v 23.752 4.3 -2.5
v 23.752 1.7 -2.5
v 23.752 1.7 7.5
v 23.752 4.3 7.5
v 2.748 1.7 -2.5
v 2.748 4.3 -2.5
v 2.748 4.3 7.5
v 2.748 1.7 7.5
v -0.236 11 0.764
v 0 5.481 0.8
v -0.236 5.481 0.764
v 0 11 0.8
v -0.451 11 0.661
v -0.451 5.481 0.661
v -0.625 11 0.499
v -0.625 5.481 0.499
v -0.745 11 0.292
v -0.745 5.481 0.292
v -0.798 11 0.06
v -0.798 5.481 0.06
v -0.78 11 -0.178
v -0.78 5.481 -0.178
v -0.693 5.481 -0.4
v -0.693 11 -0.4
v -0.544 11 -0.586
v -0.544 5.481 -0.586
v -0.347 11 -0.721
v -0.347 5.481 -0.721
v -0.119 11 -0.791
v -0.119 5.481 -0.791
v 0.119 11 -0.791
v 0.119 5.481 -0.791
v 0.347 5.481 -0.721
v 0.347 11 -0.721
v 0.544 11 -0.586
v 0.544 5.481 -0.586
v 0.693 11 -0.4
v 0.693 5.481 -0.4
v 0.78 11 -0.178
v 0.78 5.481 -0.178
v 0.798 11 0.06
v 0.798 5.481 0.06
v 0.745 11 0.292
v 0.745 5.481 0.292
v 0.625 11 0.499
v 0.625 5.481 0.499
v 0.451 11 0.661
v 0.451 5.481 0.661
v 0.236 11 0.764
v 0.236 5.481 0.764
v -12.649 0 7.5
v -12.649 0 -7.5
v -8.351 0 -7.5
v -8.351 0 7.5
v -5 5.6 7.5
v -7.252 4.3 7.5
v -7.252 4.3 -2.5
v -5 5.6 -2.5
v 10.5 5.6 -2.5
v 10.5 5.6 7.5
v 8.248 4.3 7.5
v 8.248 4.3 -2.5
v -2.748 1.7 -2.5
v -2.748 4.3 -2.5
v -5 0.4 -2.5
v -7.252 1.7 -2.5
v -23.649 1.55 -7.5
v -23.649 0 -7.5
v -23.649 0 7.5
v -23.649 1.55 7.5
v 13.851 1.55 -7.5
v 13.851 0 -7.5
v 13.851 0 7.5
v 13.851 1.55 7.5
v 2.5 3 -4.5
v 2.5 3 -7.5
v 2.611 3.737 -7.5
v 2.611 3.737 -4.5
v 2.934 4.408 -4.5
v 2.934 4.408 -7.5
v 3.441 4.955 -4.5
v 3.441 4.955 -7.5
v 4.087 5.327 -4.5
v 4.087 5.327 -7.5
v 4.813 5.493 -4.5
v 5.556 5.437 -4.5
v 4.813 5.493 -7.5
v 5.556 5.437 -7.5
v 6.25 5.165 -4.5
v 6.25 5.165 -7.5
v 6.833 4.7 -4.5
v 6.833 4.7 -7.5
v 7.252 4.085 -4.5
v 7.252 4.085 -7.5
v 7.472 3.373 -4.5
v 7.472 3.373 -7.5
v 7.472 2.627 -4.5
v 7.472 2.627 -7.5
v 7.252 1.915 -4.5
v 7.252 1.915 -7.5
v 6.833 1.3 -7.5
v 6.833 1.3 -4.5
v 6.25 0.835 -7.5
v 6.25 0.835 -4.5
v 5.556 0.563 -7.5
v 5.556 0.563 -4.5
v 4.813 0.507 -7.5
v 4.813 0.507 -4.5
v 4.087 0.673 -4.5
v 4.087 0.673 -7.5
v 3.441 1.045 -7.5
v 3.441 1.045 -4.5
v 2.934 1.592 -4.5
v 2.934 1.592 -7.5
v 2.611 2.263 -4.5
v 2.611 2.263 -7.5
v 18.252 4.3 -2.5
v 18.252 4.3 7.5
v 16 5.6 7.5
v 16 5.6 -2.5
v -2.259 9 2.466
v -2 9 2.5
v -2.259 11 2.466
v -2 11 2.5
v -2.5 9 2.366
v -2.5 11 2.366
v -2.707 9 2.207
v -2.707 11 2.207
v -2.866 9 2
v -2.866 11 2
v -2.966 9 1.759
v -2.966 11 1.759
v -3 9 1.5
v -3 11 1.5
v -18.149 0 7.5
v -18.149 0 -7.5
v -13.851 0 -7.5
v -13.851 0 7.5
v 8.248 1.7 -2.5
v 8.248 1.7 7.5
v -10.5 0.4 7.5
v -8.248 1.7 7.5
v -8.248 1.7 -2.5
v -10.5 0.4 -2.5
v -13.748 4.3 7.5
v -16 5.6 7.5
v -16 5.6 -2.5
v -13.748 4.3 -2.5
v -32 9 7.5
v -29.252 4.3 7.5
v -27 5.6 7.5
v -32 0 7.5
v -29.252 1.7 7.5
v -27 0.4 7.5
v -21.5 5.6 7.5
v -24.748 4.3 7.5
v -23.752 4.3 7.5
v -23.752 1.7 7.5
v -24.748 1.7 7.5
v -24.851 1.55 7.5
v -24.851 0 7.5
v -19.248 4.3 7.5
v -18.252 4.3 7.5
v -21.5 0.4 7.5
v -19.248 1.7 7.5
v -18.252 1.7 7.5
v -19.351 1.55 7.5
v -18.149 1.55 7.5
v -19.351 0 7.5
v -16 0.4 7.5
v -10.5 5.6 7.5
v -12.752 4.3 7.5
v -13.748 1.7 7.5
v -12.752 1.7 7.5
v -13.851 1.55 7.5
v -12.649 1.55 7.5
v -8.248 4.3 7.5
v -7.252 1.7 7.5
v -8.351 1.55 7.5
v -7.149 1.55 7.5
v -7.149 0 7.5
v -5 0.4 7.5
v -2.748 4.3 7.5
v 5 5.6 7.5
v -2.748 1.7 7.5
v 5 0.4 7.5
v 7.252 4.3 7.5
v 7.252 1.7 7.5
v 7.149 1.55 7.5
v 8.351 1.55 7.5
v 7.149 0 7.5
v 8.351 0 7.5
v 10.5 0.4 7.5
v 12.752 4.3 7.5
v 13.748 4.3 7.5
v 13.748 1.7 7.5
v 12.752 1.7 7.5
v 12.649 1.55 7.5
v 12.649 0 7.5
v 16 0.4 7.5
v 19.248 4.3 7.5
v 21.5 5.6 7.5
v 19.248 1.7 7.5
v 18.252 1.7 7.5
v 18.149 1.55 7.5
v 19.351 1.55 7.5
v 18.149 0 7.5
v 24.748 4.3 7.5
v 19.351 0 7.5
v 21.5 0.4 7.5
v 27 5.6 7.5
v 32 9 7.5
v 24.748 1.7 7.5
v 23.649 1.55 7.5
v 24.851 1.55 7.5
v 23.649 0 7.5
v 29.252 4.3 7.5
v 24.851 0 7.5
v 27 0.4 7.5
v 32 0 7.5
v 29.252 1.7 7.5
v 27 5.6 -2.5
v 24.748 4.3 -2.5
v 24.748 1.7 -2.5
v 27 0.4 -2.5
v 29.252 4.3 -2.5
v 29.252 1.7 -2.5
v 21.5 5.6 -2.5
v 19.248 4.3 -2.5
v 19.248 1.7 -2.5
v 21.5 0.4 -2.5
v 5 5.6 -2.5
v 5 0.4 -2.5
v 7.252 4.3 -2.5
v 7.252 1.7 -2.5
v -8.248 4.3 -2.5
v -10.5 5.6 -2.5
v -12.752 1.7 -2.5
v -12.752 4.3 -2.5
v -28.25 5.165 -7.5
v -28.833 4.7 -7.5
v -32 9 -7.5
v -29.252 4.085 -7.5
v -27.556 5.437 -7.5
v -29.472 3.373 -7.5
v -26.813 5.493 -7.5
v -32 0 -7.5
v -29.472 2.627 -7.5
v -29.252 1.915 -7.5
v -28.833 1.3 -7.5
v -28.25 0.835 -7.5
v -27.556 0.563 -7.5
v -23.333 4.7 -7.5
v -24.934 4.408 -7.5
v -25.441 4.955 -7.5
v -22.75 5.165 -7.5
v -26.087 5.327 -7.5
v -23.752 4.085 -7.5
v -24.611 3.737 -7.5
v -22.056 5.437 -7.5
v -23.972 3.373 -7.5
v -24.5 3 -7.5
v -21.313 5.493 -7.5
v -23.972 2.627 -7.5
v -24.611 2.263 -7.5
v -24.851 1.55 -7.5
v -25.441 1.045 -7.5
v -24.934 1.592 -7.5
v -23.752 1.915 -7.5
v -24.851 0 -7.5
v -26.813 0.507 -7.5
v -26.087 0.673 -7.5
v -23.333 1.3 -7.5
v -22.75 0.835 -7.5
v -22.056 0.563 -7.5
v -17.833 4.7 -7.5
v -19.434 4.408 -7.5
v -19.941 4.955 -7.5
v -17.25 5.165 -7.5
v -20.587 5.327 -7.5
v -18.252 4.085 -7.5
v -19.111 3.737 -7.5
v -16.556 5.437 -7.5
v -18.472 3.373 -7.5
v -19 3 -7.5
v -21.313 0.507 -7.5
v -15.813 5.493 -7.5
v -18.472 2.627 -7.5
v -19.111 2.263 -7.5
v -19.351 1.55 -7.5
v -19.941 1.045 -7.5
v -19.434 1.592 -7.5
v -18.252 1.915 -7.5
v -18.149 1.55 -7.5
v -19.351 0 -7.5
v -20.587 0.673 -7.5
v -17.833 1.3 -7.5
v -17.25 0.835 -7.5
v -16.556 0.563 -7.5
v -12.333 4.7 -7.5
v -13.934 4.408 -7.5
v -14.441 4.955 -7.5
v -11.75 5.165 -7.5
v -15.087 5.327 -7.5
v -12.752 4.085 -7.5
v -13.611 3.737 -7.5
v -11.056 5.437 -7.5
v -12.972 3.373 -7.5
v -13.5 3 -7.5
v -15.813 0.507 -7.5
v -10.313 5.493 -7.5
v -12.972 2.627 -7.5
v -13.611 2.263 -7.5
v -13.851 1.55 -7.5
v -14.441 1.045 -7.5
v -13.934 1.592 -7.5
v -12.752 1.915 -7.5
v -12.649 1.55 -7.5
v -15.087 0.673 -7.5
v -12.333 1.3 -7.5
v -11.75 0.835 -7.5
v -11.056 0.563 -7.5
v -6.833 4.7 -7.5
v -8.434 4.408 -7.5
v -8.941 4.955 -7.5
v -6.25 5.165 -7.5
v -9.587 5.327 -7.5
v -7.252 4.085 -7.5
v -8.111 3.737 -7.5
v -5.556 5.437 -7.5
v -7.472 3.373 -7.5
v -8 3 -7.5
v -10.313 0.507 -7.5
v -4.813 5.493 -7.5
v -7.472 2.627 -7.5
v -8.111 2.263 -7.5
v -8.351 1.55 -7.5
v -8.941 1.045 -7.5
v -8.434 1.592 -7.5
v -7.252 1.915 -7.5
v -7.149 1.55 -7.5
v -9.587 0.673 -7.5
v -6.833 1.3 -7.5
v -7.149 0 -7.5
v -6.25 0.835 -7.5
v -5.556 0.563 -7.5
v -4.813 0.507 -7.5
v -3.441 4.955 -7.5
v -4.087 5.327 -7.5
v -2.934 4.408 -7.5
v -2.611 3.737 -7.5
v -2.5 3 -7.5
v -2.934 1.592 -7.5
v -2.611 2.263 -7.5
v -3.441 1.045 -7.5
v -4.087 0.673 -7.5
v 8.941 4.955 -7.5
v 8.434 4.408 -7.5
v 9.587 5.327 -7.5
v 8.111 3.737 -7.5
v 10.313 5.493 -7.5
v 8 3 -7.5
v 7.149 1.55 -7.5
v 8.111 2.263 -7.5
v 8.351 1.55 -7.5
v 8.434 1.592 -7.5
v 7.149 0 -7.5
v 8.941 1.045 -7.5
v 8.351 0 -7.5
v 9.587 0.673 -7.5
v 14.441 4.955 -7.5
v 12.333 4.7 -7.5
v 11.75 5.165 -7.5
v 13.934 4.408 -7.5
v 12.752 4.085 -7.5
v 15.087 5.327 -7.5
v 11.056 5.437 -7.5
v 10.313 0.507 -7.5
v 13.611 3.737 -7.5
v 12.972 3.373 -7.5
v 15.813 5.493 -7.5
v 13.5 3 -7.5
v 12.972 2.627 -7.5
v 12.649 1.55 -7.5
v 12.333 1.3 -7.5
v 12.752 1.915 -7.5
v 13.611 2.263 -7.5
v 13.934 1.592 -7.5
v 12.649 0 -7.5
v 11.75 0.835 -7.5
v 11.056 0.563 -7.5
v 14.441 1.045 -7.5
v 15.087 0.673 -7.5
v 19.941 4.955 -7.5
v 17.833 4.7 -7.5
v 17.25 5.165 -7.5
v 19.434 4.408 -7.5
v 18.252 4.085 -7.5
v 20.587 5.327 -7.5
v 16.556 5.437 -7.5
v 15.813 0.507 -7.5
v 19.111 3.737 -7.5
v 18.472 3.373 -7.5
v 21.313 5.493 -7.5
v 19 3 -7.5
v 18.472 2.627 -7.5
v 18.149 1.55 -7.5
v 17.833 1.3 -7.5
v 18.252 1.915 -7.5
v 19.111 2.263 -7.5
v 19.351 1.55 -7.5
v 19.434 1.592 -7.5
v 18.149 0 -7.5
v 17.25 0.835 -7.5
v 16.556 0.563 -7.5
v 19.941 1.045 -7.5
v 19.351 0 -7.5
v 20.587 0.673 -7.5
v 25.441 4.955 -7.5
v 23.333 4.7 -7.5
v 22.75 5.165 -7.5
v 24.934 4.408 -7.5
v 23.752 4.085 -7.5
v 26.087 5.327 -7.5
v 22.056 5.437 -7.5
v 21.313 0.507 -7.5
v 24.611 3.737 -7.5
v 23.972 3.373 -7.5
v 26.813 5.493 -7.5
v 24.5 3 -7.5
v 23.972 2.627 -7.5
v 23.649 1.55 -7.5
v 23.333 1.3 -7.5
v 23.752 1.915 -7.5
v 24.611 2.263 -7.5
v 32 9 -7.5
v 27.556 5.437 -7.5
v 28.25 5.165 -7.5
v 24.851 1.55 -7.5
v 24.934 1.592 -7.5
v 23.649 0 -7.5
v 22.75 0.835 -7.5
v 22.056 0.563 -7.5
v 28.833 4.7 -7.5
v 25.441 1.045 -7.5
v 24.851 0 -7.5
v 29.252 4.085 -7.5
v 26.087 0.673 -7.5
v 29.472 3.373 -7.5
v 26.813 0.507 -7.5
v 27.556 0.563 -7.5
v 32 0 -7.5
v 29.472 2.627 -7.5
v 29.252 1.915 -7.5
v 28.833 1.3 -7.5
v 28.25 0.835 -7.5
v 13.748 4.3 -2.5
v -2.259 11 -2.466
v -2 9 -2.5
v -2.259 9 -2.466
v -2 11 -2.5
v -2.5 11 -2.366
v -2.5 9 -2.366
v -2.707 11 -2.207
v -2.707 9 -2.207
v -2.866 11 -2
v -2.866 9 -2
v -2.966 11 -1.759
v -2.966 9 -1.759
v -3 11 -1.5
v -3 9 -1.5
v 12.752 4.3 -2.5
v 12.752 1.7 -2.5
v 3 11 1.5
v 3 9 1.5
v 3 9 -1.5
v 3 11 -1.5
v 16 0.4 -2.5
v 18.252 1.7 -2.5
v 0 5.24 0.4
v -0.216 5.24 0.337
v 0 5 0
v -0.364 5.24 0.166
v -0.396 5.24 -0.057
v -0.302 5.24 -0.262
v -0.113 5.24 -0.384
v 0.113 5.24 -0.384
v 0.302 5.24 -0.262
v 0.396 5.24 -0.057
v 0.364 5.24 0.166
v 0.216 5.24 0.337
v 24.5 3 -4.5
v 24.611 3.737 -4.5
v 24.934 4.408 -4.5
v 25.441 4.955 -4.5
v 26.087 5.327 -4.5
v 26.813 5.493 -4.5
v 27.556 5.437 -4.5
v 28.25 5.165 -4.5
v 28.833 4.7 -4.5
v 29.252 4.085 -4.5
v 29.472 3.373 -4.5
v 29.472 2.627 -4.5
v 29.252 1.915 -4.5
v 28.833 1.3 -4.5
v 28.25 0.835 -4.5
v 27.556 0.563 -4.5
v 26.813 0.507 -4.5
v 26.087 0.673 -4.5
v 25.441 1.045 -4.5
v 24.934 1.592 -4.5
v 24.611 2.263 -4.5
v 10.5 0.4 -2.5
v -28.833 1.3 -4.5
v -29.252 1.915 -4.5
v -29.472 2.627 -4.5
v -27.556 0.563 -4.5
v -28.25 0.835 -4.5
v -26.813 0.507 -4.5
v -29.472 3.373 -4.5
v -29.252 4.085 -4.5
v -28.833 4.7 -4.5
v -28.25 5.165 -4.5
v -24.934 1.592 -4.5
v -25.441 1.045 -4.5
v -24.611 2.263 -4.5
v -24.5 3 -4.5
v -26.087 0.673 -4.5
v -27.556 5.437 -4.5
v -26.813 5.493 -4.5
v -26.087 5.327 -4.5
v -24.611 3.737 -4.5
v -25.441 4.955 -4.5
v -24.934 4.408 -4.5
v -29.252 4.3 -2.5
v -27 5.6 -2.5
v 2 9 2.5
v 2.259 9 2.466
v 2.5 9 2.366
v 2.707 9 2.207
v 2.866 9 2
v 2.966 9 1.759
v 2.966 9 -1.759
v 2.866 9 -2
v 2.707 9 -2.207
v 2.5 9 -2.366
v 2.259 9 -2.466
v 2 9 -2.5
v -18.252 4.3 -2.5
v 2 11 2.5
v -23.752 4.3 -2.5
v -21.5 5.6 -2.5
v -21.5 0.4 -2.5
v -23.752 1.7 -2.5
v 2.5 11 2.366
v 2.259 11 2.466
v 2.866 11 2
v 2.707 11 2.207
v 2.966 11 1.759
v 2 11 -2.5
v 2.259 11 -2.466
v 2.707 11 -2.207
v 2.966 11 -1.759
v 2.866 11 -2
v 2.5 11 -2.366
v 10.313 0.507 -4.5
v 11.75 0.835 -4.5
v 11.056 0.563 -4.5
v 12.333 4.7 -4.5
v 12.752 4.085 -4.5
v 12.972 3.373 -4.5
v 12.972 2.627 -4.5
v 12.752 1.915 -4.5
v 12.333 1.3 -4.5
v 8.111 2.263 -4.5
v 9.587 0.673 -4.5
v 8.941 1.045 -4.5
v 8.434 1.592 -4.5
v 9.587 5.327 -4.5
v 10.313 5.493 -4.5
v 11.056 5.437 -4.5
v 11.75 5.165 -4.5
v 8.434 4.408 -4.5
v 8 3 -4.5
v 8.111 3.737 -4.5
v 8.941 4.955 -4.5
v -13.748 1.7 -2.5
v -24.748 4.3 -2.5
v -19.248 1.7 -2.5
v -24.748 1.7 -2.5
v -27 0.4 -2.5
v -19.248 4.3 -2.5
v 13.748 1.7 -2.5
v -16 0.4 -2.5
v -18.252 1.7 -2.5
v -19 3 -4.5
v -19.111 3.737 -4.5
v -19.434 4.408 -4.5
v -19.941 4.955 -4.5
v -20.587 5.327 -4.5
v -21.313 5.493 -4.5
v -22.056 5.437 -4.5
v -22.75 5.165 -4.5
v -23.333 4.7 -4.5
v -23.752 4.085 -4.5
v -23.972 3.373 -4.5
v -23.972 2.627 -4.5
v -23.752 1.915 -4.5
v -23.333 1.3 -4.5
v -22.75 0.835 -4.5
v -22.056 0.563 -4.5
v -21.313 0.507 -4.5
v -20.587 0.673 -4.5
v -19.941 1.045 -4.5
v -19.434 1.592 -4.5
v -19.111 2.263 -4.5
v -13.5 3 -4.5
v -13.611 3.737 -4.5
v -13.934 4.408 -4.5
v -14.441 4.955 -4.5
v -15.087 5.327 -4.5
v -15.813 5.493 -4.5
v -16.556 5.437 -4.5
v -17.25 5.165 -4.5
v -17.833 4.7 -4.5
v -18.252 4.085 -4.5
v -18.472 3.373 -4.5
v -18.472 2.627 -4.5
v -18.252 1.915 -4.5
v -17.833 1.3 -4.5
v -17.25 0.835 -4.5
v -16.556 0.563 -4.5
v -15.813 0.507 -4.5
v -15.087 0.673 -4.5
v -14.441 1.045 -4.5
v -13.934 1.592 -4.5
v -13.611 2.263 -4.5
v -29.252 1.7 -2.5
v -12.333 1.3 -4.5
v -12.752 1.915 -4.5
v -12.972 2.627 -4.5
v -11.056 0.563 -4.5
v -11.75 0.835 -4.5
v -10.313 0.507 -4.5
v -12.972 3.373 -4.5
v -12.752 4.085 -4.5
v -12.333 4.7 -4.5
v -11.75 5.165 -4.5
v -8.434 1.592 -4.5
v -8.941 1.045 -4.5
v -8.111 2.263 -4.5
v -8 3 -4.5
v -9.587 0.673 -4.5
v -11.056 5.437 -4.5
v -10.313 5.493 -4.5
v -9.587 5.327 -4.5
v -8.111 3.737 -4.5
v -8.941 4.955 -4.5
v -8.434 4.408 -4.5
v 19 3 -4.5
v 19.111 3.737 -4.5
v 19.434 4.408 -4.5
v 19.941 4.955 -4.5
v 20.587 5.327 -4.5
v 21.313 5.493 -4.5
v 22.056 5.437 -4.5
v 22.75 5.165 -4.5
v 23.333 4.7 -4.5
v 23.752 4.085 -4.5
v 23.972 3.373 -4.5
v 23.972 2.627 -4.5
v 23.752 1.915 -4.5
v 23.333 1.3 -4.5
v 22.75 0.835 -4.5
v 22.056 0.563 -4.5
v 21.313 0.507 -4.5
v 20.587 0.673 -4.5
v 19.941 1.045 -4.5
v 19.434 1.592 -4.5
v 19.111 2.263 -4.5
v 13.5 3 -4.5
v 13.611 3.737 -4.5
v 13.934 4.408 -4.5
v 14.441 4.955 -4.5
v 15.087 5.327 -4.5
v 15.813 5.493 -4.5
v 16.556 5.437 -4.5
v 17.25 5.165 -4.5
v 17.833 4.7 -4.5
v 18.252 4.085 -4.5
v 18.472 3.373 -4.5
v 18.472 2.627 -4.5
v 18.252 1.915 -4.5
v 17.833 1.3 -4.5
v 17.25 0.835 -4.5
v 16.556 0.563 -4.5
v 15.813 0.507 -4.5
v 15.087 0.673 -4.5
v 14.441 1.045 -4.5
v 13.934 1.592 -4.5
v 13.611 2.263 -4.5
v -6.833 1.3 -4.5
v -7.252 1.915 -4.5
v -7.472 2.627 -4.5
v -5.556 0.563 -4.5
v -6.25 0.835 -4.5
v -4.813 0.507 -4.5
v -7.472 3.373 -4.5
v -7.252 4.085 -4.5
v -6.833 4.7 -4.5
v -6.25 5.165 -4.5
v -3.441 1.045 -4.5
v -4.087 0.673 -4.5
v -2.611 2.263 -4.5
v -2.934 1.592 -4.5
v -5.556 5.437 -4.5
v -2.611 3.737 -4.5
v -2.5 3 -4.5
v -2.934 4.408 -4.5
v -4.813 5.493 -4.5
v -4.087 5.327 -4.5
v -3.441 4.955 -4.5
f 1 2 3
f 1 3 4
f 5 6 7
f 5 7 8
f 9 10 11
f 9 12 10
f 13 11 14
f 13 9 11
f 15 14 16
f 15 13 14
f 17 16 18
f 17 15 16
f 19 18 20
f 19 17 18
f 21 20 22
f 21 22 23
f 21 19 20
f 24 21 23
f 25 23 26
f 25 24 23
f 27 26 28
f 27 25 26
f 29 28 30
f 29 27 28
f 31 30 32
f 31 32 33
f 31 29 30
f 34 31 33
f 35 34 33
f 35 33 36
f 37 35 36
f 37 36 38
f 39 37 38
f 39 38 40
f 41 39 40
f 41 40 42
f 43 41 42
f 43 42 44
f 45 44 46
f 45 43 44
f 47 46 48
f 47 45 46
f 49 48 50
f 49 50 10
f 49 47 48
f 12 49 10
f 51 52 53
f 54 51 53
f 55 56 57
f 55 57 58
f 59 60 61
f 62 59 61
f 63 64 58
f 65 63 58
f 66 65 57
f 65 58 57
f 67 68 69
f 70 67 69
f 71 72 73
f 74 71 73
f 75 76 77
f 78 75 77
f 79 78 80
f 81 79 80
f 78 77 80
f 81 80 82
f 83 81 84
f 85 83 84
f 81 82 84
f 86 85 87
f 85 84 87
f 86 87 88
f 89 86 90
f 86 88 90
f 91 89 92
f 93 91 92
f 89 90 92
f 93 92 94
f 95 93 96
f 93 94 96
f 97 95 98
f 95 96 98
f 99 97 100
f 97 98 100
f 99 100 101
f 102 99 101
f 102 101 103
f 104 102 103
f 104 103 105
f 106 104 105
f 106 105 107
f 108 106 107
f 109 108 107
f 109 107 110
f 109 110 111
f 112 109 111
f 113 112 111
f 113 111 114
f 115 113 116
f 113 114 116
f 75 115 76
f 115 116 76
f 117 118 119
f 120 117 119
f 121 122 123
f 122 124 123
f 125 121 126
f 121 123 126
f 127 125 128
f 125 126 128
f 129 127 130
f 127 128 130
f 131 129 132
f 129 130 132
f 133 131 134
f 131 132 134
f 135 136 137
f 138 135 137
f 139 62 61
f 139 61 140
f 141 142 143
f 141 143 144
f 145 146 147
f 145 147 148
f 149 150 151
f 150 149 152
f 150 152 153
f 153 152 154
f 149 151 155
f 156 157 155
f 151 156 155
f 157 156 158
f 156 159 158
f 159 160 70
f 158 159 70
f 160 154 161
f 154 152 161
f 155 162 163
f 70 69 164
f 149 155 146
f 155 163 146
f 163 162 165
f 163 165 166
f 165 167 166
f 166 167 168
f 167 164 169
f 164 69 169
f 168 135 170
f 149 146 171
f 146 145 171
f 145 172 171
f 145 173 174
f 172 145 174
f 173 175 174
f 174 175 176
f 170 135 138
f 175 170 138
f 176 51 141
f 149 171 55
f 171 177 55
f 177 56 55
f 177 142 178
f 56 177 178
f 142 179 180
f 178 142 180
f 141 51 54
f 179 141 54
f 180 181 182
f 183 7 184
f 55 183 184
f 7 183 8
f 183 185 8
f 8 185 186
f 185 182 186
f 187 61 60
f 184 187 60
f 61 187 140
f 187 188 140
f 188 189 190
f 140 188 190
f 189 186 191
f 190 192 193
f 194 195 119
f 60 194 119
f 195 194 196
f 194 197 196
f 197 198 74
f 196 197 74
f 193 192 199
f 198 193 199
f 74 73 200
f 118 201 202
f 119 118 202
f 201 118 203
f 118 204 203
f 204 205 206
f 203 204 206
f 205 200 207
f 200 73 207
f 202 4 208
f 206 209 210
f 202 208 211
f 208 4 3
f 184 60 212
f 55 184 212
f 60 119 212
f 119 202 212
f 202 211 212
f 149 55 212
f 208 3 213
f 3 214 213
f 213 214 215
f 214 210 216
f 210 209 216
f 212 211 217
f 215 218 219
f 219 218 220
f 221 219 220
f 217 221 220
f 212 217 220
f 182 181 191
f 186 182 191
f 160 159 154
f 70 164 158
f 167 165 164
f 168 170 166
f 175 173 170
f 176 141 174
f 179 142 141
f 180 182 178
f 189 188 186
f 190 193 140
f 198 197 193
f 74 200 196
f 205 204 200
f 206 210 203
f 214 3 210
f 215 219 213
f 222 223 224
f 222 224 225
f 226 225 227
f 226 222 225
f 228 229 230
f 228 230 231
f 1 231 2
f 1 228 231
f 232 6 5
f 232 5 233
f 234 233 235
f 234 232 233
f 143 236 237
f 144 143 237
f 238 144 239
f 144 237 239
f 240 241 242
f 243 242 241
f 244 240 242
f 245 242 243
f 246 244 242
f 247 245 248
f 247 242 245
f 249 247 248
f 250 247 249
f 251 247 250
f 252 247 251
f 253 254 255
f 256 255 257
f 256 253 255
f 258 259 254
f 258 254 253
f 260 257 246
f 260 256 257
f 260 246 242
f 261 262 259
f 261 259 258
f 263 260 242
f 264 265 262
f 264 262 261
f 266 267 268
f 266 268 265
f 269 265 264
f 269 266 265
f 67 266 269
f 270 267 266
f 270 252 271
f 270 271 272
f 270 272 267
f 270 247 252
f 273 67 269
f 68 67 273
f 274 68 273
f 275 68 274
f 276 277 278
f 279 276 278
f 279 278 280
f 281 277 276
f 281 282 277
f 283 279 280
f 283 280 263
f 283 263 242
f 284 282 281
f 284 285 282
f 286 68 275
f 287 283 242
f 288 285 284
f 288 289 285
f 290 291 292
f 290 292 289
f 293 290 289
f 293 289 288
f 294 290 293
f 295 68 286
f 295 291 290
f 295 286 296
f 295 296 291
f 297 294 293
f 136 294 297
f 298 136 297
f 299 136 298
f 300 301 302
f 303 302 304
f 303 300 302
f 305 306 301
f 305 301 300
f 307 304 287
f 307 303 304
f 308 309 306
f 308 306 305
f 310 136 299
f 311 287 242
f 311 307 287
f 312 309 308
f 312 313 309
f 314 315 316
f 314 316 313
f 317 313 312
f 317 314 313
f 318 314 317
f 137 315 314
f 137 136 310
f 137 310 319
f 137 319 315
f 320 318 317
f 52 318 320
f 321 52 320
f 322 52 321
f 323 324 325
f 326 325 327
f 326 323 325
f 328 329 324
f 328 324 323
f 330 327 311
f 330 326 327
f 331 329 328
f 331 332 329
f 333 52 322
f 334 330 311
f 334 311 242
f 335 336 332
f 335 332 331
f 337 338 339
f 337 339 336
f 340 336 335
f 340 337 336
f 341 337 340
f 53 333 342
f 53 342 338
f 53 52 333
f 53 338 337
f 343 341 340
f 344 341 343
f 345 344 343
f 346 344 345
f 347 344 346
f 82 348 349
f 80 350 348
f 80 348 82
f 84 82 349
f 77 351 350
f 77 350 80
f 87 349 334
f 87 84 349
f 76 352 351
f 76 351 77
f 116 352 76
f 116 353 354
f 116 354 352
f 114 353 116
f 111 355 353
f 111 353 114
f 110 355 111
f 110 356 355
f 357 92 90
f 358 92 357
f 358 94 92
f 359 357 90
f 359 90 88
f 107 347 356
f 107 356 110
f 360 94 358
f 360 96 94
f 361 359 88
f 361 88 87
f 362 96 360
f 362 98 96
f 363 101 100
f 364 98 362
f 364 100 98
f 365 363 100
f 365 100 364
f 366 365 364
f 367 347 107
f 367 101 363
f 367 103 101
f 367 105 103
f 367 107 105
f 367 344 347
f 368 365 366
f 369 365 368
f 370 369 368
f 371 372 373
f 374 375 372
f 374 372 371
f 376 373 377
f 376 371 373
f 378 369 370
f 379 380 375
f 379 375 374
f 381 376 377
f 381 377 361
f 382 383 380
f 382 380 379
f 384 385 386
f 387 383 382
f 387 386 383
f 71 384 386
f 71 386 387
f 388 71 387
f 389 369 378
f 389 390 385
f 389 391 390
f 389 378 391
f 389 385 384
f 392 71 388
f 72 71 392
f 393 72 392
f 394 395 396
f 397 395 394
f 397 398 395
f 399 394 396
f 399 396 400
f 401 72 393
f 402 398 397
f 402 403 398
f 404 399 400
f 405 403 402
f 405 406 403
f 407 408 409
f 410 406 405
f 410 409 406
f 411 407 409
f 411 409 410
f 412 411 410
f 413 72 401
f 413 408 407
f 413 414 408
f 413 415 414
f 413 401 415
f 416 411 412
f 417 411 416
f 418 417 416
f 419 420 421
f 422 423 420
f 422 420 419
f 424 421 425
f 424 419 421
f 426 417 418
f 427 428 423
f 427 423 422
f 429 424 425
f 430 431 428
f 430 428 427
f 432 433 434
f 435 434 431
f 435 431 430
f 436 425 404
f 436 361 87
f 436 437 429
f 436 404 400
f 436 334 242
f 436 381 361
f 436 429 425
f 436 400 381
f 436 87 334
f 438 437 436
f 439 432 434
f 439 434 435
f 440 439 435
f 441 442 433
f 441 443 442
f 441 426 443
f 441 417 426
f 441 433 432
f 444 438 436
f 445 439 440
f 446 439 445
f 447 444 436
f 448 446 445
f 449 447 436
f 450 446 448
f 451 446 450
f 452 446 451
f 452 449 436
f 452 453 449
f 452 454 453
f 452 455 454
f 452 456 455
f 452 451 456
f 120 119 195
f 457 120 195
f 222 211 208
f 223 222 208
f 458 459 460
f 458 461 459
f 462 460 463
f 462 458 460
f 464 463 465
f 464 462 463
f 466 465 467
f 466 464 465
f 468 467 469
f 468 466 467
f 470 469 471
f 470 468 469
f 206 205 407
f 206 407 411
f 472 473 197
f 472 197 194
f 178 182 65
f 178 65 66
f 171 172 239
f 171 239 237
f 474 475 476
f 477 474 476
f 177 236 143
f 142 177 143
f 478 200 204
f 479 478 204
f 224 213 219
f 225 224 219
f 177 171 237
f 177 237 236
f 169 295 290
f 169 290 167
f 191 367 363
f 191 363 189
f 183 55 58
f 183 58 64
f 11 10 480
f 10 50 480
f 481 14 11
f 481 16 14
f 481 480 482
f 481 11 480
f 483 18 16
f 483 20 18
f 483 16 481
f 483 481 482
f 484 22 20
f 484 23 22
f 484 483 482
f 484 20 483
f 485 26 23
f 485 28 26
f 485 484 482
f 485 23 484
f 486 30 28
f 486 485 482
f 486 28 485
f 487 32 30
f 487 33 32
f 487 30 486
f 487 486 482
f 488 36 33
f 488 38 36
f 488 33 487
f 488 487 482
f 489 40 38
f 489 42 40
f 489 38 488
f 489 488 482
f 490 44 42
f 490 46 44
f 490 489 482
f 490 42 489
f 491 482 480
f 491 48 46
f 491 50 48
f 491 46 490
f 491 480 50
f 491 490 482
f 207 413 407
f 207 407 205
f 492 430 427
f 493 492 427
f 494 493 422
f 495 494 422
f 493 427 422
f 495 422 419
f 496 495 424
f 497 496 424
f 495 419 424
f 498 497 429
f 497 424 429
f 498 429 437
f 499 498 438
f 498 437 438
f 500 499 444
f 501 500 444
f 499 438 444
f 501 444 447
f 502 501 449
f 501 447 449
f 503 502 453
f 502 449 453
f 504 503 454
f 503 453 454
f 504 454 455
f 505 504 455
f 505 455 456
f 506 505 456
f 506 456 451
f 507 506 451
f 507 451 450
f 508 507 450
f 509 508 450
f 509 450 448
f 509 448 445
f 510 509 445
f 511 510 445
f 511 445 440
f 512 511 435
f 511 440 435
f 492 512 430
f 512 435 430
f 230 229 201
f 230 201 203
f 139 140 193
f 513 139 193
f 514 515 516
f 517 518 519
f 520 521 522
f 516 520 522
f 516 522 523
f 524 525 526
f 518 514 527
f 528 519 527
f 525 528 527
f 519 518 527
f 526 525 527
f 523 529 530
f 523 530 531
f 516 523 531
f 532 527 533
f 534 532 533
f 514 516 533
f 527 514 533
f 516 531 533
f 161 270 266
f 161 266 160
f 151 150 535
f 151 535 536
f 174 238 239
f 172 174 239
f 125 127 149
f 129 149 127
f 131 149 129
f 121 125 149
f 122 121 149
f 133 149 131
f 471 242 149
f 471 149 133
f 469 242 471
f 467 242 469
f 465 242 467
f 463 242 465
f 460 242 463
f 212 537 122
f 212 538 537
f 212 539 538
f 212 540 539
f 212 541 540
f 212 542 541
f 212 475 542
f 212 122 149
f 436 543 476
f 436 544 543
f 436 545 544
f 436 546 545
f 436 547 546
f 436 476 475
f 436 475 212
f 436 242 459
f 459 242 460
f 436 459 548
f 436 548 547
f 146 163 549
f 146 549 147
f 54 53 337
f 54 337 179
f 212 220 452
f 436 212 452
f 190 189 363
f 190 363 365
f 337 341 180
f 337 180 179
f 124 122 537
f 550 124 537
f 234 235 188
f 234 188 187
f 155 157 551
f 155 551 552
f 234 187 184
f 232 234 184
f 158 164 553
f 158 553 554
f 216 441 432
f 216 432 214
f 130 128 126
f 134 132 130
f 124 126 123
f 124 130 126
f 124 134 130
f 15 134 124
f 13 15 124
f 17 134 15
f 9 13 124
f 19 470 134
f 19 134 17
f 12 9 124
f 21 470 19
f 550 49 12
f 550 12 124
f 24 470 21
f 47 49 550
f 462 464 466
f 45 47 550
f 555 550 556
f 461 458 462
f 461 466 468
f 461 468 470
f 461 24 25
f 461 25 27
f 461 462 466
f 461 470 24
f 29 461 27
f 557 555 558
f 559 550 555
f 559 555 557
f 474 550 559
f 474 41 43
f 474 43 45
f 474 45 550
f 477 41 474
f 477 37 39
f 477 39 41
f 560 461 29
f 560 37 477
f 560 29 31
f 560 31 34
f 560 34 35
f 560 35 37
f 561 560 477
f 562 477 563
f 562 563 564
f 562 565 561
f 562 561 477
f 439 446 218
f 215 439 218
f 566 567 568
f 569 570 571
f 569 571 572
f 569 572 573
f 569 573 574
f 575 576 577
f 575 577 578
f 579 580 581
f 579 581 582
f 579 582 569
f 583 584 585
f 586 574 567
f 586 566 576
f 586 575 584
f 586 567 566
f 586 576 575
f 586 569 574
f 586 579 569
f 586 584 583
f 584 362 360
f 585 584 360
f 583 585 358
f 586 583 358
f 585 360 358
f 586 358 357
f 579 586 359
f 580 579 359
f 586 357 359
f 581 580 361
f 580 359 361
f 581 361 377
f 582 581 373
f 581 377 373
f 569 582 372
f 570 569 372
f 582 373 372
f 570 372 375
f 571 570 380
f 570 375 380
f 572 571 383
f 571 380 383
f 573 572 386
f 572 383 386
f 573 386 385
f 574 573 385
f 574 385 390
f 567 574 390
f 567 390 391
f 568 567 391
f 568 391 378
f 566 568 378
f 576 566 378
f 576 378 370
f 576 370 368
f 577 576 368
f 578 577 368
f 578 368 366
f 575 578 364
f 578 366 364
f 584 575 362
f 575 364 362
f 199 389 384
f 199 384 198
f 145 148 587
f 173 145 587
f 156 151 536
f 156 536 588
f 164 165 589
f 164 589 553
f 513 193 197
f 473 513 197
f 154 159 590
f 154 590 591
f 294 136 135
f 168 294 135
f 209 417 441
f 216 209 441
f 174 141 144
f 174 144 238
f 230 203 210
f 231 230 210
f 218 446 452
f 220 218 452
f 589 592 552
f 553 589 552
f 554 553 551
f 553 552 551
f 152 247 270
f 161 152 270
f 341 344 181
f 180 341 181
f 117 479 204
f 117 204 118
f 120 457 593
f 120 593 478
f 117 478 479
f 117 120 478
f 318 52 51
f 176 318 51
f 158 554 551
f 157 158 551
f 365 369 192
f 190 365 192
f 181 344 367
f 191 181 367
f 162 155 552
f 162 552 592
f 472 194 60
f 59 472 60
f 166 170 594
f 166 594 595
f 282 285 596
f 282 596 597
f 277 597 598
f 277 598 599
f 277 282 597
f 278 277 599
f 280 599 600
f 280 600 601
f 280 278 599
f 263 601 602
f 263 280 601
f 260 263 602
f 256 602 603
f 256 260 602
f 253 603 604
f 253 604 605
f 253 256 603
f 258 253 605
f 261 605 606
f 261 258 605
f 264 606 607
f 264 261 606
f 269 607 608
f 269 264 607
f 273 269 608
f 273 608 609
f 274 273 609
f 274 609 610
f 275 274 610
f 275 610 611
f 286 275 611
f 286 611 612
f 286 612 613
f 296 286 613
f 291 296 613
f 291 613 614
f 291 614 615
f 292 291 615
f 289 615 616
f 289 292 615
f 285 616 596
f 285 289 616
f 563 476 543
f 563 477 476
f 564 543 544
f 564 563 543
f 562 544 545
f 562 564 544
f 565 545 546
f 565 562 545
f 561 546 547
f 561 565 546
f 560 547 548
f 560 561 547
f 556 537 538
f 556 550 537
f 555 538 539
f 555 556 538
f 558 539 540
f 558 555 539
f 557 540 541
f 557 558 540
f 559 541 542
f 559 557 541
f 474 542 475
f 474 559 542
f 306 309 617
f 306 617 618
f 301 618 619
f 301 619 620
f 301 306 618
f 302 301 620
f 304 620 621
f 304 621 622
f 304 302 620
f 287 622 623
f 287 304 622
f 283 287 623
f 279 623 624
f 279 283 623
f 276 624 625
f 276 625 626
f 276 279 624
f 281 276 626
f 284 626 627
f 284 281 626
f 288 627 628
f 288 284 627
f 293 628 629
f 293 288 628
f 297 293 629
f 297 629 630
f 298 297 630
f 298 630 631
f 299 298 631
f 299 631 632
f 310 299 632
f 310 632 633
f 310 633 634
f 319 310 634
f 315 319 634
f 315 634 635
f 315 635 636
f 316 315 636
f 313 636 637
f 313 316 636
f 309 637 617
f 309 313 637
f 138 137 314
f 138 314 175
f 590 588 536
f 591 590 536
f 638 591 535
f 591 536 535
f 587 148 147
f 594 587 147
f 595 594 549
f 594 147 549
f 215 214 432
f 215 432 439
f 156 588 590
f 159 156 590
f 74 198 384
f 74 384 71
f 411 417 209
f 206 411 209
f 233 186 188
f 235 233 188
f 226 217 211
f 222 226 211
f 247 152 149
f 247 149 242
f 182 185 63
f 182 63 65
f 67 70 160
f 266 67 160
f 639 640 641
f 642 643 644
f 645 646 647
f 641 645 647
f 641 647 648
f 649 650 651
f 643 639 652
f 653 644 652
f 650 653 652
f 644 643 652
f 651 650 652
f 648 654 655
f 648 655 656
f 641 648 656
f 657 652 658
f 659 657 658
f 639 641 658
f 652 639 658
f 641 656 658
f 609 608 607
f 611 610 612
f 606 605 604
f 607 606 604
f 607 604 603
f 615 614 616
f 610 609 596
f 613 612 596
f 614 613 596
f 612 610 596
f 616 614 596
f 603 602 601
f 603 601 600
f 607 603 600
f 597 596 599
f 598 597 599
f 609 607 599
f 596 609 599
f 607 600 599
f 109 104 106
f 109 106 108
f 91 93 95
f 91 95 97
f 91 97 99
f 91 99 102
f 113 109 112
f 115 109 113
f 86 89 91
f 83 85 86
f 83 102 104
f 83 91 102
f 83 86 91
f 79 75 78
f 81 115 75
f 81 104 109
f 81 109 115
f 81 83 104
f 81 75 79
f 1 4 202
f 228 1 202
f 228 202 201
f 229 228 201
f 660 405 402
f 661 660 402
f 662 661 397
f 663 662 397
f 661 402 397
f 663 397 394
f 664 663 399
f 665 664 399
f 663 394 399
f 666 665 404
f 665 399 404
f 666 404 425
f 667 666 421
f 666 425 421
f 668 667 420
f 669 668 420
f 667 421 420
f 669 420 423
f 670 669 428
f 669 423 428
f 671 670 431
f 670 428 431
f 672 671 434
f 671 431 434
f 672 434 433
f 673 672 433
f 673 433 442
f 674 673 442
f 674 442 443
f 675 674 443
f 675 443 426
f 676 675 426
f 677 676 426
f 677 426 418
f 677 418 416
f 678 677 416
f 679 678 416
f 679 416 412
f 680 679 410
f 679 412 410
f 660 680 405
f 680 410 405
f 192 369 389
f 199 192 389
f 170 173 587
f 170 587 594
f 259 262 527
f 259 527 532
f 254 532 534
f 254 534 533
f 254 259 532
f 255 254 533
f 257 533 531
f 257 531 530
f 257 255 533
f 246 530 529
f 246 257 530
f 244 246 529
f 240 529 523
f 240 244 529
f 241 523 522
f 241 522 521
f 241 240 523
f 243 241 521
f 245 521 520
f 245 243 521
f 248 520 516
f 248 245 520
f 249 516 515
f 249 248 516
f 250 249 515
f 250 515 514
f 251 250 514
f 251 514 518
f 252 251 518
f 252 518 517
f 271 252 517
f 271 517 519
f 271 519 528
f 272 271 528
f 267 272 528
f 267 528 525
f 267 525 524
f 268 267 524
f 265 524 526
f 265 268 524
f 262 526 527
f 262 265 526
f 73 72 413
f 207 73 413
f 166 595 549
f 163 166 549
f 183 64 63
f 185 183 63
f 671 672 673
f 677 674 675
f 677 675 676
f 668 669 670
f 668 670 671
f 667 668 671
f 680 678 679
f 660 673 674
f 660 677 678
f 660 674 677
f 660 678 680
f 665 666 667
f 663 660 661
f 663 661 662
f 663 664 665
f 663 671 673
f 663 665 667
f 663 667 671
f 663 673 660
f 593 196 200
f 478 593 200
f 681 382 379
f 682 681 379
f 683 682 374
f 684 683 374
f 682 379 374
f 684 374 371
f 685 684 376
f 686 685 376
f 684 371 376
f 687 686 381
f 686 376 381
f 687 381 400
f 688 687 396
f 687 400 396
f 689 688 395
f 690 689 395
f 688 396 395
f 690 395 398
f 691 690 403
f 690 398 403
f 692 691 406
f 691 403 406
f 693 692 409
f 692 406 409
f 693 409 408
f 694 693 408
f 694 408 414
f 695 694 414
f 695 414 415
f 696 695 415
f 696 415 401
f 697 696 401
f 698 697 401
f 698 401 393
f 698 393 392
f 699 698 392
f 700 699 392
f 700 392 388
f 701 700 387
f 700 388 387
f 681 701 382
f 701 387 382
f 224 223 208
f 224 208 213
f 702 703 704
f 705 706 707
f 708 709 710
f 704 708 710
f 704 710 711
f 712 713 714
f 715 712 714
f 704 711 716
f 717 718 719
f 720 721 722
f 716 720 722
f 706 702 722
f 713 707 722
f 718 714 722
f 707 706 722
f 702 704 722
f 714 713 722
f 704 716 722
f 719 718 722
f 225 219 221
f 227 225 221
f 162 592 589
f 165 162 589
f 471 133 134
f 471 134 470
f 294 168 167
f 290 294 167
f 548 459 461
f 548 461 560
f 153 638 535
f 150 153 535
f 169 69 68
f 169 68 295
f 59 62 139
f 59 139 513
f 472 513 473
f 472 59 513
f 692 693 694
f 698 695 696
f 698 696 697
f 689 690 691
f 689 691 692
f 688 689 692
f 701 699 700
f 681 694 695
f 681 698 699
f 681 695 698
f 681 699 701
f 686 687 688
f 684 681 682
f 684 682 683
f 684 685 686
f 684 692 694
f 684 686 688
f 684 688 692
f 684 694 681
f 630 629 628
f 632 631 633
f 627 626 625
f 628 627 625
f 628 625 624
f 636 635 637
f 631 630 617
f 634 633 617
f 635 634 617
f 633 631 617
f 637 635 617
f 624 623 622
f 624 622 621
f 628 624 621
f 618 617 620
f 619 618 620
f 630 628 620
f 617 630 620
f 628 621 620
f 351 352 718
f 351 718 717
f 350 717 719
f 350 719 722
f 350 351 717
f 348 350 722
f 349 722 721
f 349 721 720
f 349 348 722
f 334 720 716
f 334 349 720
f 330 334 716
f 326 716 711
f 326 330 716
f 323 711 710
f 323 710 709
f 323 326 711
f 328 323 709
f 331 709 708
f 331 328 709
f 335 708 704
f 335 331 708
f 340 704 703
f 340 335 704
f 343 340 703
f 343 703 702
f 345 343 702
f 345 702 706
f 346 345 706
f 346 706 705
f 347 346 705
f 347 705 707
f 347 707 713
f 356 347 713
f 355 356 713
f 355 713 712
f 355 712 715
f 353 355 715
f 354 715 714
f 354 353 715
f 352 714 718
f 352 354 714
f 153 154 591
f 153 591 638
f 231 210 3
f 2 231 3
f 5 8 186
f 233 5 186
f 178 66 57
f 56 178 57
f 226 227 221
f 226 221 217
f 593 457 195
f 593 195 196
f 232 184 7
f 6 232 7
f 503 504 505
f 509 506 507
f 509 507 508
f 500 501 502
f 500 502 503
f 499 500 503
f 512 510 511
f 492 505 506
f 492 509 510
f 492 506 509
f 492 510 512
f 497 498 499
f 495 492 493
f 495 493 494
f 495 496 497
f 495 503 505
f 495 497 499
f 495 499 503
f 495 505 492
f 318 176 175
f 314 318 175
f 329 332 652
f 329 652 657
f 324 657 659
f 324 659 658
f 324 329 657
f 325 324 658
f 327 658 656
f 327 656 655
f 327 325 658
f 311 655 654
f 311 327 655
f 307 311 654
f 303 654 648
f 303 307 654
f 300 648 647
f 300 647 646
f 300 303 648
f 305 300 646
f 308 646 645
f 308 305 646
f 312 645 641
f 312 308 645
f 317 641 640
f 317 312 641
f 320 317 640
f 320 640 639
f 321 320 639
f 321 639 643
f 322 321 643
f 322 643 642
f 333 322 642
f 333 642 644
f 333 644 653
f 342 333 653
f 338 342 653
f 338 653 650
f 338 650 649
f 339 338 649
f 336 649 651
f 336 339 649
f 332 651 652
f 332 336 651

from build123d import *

# Parameters (mm, degrees)
SKETCH1_W           = 64
SKETCH1_H           = 15
BOSS_EXTRUDE1_DEPTH = 9
CUT_EXTRUDE1_DEPTH  = 10
SKETCH3_R           = 2.5
CUT_EXTRUDE2_DEPTH  = 3
SKETCH4_W           = 6
SKETCH4_H           = 5
BOSS_EXTRUDE2_DEPTH = 2
FILLET1_R           = 1
SKETCH9_W           = 1.20235501
SKETCH9_H           = 15
CUT_EXTRUDE3_DEPTH  = 1.55


with BuildPart() as part:
    # Sketch1 → Boss-Extrude1 (new body)
    with BuildSketch(Plane(origin=(0, 0, 0), x_dir=(1, 0, 0), z_dir=(0, 1, 0))):
        Rectangle(SKETCH1_W, SKETCH1_H)
    extrude(amount=BOSS_EXTRUDE1_DEPTH)

    # Sketch2 → Cut-Extrude1 (cut)
    with BuildSketch(Plane.XY.offset(7.5)):
        Polygon((8.24833395, 4.3), (8.24833395, 1.7), (10.5, 0.4), (12.75166605, 1.7), (12.75166605, 4.3), (10.5, 5.6), align=None)
        Polygon((13.74833395, 4.3), (13.74833395, 1.7), (16, 0.4), (18.25166605, 1.7), (18.25166605, 4.3), (16, 5.6), align=None)
        Polygon((19.24833395, 4.3), (19.24833395, 1.7), (21.5, 0.4), (23.75166605, 1.7), (23.75166605, 4.3), (21.5, 5.6), align=None)
        Polygon((24.74833395, 4.3), (24.74833395, 1.7), (27, 0.4), (29.25166605, 1.7), (29.25166605, 4.3), (27, 5.6), align=None)
        Polygon((2.74833395, 4.3), (2.74833395, 1.7), (5, 0.4), (7.25166605, 1.7), (7.25166605, 4.3), (5, 5.6), align=None)
    cut_extrude1 = extrude(amount=-CUT_EXTRUDE1_DEPTH, mode=Mode.SUBTRACT)

    # Mirror1: Cut-Extrude1 across plane
    add(cut_extrude1.mirror(Plane(origin=(0, 0, 0), x_dir=(0, 0, 1), z_dir=(1, 0, 0))), mode=Mode.SUBTRACT)

    # Sketch3 → Cut-Extrude2 (cut)
    with BuildSketch(Plane(origin=(0, 0, -7.5), x_dir=(-1, 0, 0), z_dir=(0, 0, -1))):
        with Locations((-5, 3)):
            Circle(SKETCH3_R)
        with Locations((-10.5, 3)):
            Circle(SKETCH3_R)
        with Locations((-16, 3)):
            Circle(SKETCH3_R)
        with Locations((-21.5, 3)):
            Circle(SKETCH3_R)
        with Locations((-27, 3)):
            Circle(SKETCH3_R)
    cut_extrude2 = extrude(amount=-CUT_EXTRUDE2_DEPTH, mode=Mode.SUBTRACT)

    # Mirror2: Cut-Extrude2 across plane
    add(cut_extrude2.mirror(Plane(origin=(0, 0, 0), x_dir=(0, 0, 1), z_dir=(1, 0, 0))), mode=Mode.SUBTRACT)

    # Sketch4 → Boss-Extrude2 (add)
    with BuildSketch(Plane(origin=(0, 9, 0), x_dir=(1, 0, 0), z_dir=(0, 1, 0))):
        Rectangle(SKETCH4_W, SKETCH4_H)
    extrude(amount=BOSS_EXTRUDE2_DEPTH)

    # Fillet1
    fillet1_edges = [part.edges().sort_by_distance(p)[0] for p in [
        (-3, 10, 2.5),
        (3, 10, 2.5),
        (3, 10, -2.5),
        (-3, 10, -2.5),
    ]]
    fillet(fillet1_edges, radius=FILLET1_R)

    # Sketch7 → M2 Tapped Hole2 (revolve, cut)
    with BuildSketch(Plane(origin=(0, 11, 0), x_dir=(0, 0, 1), z_dir=(1, 0, 0))):
        Polygon((0, 0), (0, 6), (0.8, 5.519311505), (0.8, 0), align=None)
    revolve(axis=Axis((0, 17.35, 0), (0, -1, 0)), mode=Mode.SUBTRACT)

    # Sketch9 → Cut-Extrude3 (cut)
    with BuildSketch(Plane.XZ):
        with Locations((7.75, 0)):
            Rectangle(SKETCH9_W, SKETCH9_H)
        with Locations((13.25, 0)):
            Rectangle(SKETCH9_W, SKETCH9_H)
        with Locations((18.75, 0)):
            Rectangle(SKETCH9_W, SKETCH9_H)
        with Locations((24.25, 0)):
            Rectangle(SKETCH9_W, SKETCH9_H)
    cut_extrude3 = extrude(amount=-CUT_EXTRUDE3_DEPTH, mode=Mode.SUBTRACT)

    # Mirror3: Cut-Extrude3 across plane
    add(cut_extrude3.mirror(Plane(origin=(0, 0, 0), x_dir=(0, 0, 1), z_dir=(1, 0, 0))), mode=Mode.SUBTRACT)


solid = part.part
